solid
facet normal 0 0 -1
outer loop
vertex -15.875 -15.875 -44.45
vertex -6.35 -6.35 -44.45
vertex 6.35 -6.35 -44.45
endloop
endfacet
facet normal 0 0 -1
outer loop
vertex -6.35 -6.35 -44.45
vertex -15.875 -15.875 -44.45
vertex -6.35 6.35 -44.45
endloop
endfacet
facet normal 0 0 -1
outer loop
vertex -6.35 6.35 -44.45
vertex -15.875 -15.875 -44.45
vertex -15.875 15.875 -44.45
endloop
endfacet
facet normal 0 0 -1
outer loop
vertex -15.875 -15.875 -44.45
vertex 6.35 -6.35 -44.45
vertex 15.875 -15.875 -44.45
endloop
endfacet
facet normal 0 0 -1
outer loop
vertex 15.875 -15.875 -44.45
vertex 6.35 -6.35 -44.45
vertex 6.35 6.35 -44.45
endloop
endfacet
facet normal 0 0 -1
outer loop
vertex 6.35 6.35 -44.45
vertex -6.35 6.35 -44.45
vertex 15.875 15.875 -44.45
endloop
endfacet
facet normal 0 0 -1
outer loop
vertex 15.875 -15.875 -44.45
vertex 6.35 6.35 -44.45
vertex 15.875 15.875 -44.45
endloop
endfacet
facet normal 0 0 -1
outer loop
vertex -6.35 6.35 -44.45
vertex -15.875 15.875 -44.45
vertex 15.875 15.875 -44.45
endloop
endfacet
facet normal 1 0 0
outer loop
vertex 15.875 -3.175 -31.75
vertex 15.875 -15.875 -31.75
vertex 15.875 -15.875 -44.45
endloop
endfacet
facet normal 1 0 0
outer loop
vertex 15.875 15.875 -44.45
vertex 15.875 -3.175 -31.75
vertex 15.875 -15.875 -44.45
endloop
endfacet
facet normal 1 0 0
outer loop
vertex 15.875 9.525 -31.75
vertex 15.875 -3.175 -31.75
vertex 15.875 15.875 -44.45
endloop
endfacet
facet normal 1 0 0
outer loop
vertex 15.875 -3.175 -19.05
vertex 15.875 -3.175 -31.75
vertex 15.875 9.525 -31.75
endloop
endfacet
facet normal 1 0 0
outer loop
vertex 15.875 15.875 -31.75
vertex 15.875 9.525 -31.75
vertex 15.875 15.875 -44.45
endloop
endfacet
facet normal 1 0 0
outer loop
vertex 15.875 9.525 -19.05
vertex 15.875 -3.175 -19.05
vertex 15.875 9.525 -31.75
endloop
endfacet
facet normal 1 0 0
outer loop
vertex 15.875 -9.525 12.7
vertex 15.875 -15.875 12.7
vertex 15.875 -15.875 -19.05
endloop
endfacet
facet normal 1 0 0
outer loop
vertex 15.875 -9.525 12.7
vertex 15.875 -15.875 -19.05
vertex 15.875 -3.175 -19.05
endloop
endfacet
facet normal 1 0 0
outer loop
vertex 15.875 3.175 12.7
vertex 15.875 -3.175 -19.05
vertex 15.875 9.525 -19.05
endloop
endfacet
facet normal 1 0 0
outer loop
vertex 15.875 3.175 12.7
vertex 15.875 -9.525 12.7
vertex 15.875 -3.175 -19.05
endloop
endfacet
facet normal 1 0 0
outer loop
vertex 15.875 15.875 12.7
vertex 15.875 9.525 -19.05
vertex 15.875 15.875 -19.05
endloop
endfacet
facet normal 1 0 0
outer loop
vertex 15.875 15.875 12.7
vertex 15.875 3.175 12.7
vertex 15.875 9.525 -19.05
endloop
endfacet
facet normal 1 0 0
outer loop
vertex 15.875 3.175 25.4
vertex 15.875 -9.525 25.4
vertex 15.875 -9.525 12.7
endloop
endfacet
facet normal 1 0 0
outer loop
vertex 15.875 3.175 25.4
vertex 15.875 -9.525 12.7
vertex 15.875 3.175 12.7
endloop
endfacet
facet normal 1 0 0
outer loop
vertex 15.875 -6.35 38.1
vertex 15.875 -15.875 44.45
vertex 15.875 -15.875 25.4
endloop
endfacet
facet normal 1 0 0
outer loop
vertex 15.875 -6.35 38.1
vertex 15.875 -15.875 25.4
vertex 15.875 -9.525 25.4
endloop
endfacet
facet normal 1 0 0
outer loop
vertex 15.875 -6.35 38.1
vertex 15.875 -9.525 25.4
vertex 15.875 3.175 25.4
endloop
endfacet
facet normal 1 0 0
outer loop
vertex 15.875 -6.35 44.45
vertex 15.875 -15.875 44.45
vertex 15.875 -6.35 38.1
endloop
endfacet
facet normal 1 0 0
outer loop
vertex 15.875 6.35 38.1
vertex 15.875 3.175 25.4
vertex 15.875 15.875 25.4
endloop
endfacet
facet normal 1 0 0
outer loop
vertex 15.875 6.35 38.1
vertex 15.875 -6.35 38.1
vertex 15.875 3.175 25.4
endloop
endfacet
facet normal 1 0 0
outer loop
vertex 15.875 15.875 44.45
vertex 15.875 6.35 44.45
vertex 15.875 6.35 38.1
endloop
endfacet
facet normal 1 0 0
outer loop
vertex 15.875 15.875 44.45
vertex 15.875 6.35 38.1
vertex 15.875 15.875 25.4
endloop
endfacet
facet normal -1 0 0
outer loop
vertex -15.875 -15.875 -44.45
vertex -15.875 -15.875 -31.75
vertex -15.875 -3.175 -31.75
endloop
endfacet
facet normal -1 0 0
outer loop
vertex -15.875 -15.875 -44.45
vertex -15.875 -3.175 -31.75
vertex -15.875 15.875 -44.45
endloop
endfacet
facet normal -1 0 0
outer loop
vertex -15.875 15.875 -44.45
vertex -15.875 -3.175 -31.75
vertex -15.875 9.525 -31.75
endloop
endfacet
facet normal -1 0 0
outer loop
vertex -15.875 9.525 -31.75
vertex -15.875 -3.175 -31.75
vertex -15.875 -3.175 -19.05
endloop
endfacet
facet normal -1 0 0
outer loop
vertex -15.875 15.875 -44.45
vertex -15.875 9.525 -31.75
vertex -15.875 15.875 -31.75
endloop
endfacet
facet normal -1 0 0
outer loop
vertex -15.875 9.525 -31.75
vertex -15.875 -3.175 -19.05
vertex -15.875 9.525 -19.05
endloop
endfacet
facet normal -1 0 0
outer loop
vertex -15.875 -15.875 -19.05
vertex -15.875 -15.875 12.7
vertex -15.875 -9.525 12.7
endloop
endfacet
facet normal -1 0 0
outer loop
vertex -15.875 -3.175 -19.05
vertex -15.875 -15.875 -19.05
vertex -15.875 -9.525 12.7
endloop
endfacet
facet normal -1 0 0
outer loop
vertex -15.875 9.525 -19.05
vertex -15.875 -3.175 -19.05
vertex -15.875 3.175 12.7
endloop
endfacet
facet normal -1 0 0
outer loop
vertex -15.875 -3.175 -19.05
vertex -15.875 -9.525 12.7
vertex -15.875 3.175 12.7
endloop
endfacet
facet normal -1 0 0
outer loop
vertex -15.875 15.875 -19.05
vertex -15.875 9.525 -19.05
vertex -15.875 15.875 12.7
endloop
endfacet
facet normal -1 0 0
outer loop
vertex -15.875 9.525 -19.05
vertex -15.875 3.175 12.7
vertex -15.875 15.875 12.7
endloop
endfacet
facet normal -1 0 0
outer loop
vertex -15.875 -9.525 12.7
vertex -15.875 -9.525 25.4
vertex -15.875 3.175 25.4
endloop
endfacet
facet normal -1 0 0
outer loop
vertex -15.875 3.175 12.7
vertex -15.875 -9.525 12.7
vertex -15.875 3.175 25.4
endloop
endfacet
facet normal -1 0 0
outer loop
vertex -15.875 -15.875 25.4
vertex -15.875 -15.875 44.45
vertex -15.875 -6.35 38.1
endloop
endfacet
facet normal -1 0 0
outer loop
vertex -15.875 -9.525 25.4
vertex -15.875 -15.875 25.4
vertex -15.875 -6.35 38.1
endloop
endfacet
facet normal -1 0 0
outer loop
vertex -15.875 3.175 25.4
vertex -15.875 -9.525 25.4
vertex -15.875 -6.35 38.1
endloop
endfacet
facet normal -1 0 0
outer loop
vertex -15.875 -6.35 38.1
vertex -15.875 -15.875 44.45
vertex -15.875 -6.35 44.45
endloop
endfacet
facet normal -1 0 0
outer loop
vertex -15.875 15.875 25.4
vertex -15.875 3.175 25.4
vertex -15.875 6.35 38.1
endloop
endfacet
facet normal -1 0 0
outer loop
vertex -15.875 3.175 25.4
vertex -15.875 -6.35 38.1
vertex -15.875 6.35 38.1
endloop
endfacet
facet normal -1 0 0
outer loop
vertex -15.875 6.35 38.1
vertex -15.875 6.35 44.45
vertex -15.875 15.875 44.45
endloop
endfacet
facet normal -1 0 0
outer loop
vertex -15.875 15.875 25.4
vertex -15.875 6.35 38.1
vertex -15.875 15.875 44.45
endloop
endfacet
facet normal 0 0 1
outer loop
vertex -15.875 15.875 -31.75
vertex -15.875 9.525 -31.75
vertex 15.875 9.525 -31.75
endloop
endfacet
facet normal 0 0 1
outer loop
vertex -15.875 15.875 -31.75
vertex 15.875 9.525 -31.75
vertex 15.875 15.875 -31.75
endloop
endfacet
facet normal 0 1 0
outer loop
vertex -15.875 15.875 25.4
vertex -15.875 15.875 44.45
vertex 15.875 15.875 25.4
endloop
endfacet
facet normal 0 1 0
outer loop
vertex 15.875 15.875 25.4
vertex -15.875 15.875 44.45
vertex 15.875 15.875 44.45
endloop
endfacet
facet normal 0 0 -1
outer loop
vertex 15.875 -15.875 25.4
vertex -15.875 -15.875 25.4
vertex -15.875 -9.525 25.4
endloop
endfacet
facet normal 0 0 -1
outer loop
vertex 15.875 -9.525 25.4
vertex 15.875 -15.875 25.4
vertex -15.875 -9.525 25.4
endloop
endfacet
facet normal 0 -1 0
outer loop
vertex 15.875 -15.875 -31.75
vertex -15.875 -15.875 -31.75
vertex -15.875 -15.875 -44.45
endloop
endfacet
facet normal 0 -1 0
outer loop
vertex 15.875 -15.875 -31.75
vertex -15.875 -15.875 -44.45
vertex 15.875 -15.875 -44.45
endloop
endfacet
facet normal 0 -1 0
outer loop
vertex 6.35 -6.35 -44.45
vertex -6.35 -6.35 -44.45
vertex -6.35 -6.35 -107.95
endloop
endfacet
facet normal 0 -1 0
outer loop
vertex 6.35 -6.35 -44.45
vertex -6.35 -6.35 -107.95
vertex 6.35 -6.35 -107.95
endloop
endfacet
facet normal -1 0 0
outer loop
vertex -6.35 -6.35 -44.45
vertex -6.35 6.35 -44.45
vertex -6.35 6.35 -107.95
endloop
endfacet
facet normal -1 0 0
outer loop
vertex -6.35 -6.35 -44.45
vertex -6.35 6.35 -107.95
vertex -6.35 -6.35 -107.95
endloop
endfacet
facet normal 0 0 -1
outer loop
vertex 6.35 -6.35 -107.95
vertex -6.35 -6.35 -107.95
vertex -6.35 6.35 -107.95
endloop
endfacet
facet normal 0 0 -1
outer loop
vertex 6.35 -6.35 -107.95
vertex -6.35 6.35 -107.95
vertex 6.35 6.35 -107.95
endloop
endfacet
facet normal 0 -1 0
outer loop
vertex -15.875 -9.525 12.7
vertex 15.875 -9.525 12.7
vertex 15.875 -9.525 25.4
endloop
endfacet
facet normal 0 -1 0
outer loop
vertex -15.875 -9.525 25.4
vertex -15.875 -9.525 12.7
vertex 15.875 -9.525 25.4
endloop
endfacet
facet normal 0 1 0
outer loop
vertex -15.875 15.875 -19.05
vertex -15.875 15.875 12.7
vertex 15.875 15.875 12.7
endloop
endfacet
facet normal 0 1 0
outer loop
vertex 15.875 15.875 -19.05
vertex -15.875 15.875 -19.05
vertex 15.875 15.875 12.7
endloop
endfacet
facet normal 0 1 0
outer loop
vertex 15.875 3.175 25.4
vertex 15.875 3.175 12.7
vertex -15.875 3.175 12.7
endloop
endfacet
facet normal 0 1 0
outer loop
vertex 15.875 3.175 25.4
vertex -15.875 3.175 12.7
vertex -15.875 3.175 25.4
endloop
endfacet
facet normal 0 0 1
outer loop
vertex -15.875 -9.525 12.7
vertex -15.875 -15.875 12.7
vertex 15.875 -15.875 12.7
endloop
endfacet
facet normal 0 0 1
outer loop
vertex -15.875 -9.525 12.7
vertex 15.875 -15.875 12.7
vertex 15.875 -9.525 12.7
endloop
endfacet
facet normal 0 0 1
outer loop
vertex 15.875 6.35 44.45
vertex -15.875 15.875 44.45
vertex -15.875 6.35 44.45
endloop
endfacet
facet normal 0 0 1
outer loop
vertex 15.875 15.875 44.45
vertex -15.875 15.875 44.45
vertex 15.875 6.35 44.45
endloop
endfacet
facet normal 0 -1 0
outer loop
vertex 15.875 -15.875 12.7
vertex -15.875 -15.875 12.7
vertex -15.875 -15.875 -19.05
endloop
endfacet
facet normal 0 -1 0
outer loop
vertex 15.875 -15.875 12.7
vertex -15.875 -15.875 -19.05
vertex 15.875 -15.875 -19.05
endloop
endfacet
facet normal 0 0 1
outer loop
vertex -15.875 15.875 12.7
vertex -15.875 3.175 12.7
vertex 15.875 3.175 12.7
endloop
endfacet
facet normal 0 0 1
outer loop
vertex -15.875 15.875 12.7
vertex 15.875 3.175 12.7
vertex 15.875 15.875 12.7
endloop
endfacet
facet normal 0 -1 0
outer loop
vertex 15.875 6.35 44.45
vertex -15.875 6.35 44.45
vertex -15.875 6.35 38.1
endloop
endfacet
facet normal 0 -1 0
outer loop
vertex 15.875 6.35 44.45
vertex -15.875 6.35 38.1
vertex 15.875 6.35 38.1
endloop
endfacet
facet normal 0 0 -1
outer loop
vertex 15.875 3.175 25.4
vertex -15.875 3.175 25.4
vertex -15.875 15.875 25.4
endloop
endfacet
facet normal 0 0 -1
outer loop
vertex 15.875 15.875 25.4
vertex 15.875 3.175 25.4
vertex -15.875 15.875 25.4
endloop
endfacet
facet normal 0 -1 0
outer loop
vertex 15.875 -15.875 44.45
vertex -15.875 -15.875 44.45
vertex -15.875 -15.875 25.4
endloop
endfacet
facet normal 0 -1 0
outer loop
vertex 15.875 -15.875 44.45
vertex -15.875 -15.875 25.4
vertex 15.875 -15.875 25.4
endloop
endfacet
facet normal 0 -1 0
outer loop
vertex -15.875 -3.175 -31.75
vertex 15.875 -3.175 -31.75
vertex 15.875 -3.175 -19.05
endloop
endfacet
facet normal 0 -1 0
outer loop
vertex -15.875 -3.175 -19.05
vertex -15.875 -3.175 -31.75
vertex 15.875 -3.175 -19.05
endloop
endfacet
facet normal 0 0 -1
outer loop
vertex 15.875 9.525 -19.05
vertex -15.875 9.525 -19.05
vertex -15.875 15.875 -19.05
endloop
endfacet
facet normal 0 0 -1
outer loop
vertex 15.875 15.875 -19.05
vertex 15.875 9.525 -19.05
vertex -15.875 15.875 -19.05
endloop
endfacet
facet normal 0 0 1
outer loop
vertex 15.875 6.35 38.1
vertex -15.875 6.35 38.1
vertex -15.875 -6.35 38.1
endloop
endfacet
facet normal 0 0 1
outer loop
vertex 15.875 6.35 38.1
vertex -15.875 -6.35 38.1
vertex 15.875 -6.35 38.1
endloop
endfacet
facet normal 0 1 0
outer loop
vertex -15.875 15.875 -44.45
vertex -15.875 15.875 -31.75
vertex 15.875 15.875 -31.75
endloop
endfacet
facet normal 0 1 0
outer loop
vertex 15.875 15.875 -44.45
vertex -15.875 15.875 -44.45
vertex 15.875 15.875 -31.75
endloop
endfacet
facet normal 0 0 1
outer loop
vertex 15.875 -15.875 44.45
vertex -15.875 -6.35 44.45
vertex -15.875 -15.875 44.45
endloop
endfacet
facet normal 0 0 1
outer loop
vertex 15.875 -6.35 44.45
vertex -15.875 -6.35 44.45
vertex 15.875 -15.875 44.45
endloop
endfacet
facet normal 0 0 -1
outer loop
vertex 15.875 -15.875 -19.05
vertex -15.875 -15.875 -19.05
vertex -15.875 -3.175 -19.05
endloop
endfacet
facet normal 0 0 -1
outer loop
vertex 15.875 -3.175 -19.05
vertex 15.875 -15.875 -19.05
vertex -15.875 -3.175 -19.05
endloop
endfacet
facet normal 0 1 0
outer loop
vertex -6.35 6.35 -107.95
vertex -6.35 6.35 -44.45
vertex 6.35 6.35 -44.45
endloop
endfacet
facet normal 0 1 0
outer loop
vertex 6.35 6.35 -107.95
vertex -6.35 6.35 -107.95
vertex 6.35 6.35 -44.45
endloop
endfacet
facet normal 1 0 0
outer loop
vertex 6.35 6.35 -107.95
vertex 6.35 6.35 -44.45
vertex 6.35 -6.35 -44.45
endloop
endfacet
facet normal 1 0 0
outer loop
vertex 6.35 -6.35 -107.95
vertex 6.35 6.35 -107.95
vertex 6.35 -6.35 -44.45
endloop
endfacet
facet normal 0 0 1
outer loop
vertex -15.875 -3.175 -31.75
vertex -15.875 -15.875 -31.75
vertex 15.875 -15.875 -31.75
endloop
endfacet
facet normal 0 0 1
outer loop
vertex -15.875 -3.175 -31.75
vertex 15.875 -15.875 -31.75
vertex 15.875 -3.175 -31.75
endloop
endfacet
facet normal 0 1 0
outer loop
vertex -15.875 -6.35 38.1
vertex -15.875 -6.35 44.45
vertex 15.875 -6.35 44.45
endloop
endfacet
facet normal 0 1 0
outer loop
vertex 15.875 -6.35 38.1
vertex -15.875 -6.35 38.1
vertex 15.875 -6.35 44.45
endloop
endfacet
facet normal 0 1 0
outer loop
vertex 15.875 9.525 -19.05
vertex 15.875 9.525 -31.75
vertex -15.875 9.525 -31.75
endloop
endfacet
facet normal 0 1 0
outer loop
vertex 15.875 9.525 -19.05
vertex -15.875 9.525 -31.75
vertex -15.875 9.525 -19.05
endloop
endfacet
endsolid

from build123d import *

# Parameters (mm, degrees)
F0_W     = 31.75
F0_H     = 31.75
F1_DEPTH = 44.45
F2_W     = 12.7
F2_H     = 12.7
F3_DEPTH = 63.5
F4_W     = 31.75
F4_H     = 12.7
F5_DEPTH = 6.35
F6_W     = 12.7
F6_H     = 12.7
F6_W_2   = 6.35
F7_DEPTH = 31.75


with BuildPart() as f1:
    # F0 (on Top) → F1 (new body, symmetric)
    with BuildSketch(Plane.XY):
        Rectangle(F0_W, F0_H)
    extrude(amount=F1_DEPTH, both=True)

    # F2 (on face) → F3 (join)
    with BuildSketch(Plane(origin=(0, 0, -44.45), x_dir=(1, 0, 0), z_dir=(0, 0, -1))):
        Rectangle(F2_W, F2_H)
    extrude(amount=F3_DEPTH)

    # F4 (on face) → F5 (cut)
    with BuildSketch(Plane.XY.offset(44.45)):
        Rectangle(F4_W, F4_H)
    extrude(amount=-F5_DEPTH, mode=Mode.SUBTRACT)

    # F6 (on face) → F7 (cut, through all)
    with BuildSketch(Plane.YZ.offset(15.875)):
        with Locations((9.525, 19.05)):
            Rectangle(F6_W, F6_H)
        with Locations((12.7, -25.4)):
            Rectangle(F6_W_2, F6_H)
        with Locations((-9.525, -25.4)):
            Rectangle(F6_W, F6_H)
        with Locations((-12.7, 19.05)):
            Rectangle(F6_W_2, F6_H)
    extrude(amount=-F7_DEPTH, mode=Mode.SUBTRACT)


solid = f1.part
